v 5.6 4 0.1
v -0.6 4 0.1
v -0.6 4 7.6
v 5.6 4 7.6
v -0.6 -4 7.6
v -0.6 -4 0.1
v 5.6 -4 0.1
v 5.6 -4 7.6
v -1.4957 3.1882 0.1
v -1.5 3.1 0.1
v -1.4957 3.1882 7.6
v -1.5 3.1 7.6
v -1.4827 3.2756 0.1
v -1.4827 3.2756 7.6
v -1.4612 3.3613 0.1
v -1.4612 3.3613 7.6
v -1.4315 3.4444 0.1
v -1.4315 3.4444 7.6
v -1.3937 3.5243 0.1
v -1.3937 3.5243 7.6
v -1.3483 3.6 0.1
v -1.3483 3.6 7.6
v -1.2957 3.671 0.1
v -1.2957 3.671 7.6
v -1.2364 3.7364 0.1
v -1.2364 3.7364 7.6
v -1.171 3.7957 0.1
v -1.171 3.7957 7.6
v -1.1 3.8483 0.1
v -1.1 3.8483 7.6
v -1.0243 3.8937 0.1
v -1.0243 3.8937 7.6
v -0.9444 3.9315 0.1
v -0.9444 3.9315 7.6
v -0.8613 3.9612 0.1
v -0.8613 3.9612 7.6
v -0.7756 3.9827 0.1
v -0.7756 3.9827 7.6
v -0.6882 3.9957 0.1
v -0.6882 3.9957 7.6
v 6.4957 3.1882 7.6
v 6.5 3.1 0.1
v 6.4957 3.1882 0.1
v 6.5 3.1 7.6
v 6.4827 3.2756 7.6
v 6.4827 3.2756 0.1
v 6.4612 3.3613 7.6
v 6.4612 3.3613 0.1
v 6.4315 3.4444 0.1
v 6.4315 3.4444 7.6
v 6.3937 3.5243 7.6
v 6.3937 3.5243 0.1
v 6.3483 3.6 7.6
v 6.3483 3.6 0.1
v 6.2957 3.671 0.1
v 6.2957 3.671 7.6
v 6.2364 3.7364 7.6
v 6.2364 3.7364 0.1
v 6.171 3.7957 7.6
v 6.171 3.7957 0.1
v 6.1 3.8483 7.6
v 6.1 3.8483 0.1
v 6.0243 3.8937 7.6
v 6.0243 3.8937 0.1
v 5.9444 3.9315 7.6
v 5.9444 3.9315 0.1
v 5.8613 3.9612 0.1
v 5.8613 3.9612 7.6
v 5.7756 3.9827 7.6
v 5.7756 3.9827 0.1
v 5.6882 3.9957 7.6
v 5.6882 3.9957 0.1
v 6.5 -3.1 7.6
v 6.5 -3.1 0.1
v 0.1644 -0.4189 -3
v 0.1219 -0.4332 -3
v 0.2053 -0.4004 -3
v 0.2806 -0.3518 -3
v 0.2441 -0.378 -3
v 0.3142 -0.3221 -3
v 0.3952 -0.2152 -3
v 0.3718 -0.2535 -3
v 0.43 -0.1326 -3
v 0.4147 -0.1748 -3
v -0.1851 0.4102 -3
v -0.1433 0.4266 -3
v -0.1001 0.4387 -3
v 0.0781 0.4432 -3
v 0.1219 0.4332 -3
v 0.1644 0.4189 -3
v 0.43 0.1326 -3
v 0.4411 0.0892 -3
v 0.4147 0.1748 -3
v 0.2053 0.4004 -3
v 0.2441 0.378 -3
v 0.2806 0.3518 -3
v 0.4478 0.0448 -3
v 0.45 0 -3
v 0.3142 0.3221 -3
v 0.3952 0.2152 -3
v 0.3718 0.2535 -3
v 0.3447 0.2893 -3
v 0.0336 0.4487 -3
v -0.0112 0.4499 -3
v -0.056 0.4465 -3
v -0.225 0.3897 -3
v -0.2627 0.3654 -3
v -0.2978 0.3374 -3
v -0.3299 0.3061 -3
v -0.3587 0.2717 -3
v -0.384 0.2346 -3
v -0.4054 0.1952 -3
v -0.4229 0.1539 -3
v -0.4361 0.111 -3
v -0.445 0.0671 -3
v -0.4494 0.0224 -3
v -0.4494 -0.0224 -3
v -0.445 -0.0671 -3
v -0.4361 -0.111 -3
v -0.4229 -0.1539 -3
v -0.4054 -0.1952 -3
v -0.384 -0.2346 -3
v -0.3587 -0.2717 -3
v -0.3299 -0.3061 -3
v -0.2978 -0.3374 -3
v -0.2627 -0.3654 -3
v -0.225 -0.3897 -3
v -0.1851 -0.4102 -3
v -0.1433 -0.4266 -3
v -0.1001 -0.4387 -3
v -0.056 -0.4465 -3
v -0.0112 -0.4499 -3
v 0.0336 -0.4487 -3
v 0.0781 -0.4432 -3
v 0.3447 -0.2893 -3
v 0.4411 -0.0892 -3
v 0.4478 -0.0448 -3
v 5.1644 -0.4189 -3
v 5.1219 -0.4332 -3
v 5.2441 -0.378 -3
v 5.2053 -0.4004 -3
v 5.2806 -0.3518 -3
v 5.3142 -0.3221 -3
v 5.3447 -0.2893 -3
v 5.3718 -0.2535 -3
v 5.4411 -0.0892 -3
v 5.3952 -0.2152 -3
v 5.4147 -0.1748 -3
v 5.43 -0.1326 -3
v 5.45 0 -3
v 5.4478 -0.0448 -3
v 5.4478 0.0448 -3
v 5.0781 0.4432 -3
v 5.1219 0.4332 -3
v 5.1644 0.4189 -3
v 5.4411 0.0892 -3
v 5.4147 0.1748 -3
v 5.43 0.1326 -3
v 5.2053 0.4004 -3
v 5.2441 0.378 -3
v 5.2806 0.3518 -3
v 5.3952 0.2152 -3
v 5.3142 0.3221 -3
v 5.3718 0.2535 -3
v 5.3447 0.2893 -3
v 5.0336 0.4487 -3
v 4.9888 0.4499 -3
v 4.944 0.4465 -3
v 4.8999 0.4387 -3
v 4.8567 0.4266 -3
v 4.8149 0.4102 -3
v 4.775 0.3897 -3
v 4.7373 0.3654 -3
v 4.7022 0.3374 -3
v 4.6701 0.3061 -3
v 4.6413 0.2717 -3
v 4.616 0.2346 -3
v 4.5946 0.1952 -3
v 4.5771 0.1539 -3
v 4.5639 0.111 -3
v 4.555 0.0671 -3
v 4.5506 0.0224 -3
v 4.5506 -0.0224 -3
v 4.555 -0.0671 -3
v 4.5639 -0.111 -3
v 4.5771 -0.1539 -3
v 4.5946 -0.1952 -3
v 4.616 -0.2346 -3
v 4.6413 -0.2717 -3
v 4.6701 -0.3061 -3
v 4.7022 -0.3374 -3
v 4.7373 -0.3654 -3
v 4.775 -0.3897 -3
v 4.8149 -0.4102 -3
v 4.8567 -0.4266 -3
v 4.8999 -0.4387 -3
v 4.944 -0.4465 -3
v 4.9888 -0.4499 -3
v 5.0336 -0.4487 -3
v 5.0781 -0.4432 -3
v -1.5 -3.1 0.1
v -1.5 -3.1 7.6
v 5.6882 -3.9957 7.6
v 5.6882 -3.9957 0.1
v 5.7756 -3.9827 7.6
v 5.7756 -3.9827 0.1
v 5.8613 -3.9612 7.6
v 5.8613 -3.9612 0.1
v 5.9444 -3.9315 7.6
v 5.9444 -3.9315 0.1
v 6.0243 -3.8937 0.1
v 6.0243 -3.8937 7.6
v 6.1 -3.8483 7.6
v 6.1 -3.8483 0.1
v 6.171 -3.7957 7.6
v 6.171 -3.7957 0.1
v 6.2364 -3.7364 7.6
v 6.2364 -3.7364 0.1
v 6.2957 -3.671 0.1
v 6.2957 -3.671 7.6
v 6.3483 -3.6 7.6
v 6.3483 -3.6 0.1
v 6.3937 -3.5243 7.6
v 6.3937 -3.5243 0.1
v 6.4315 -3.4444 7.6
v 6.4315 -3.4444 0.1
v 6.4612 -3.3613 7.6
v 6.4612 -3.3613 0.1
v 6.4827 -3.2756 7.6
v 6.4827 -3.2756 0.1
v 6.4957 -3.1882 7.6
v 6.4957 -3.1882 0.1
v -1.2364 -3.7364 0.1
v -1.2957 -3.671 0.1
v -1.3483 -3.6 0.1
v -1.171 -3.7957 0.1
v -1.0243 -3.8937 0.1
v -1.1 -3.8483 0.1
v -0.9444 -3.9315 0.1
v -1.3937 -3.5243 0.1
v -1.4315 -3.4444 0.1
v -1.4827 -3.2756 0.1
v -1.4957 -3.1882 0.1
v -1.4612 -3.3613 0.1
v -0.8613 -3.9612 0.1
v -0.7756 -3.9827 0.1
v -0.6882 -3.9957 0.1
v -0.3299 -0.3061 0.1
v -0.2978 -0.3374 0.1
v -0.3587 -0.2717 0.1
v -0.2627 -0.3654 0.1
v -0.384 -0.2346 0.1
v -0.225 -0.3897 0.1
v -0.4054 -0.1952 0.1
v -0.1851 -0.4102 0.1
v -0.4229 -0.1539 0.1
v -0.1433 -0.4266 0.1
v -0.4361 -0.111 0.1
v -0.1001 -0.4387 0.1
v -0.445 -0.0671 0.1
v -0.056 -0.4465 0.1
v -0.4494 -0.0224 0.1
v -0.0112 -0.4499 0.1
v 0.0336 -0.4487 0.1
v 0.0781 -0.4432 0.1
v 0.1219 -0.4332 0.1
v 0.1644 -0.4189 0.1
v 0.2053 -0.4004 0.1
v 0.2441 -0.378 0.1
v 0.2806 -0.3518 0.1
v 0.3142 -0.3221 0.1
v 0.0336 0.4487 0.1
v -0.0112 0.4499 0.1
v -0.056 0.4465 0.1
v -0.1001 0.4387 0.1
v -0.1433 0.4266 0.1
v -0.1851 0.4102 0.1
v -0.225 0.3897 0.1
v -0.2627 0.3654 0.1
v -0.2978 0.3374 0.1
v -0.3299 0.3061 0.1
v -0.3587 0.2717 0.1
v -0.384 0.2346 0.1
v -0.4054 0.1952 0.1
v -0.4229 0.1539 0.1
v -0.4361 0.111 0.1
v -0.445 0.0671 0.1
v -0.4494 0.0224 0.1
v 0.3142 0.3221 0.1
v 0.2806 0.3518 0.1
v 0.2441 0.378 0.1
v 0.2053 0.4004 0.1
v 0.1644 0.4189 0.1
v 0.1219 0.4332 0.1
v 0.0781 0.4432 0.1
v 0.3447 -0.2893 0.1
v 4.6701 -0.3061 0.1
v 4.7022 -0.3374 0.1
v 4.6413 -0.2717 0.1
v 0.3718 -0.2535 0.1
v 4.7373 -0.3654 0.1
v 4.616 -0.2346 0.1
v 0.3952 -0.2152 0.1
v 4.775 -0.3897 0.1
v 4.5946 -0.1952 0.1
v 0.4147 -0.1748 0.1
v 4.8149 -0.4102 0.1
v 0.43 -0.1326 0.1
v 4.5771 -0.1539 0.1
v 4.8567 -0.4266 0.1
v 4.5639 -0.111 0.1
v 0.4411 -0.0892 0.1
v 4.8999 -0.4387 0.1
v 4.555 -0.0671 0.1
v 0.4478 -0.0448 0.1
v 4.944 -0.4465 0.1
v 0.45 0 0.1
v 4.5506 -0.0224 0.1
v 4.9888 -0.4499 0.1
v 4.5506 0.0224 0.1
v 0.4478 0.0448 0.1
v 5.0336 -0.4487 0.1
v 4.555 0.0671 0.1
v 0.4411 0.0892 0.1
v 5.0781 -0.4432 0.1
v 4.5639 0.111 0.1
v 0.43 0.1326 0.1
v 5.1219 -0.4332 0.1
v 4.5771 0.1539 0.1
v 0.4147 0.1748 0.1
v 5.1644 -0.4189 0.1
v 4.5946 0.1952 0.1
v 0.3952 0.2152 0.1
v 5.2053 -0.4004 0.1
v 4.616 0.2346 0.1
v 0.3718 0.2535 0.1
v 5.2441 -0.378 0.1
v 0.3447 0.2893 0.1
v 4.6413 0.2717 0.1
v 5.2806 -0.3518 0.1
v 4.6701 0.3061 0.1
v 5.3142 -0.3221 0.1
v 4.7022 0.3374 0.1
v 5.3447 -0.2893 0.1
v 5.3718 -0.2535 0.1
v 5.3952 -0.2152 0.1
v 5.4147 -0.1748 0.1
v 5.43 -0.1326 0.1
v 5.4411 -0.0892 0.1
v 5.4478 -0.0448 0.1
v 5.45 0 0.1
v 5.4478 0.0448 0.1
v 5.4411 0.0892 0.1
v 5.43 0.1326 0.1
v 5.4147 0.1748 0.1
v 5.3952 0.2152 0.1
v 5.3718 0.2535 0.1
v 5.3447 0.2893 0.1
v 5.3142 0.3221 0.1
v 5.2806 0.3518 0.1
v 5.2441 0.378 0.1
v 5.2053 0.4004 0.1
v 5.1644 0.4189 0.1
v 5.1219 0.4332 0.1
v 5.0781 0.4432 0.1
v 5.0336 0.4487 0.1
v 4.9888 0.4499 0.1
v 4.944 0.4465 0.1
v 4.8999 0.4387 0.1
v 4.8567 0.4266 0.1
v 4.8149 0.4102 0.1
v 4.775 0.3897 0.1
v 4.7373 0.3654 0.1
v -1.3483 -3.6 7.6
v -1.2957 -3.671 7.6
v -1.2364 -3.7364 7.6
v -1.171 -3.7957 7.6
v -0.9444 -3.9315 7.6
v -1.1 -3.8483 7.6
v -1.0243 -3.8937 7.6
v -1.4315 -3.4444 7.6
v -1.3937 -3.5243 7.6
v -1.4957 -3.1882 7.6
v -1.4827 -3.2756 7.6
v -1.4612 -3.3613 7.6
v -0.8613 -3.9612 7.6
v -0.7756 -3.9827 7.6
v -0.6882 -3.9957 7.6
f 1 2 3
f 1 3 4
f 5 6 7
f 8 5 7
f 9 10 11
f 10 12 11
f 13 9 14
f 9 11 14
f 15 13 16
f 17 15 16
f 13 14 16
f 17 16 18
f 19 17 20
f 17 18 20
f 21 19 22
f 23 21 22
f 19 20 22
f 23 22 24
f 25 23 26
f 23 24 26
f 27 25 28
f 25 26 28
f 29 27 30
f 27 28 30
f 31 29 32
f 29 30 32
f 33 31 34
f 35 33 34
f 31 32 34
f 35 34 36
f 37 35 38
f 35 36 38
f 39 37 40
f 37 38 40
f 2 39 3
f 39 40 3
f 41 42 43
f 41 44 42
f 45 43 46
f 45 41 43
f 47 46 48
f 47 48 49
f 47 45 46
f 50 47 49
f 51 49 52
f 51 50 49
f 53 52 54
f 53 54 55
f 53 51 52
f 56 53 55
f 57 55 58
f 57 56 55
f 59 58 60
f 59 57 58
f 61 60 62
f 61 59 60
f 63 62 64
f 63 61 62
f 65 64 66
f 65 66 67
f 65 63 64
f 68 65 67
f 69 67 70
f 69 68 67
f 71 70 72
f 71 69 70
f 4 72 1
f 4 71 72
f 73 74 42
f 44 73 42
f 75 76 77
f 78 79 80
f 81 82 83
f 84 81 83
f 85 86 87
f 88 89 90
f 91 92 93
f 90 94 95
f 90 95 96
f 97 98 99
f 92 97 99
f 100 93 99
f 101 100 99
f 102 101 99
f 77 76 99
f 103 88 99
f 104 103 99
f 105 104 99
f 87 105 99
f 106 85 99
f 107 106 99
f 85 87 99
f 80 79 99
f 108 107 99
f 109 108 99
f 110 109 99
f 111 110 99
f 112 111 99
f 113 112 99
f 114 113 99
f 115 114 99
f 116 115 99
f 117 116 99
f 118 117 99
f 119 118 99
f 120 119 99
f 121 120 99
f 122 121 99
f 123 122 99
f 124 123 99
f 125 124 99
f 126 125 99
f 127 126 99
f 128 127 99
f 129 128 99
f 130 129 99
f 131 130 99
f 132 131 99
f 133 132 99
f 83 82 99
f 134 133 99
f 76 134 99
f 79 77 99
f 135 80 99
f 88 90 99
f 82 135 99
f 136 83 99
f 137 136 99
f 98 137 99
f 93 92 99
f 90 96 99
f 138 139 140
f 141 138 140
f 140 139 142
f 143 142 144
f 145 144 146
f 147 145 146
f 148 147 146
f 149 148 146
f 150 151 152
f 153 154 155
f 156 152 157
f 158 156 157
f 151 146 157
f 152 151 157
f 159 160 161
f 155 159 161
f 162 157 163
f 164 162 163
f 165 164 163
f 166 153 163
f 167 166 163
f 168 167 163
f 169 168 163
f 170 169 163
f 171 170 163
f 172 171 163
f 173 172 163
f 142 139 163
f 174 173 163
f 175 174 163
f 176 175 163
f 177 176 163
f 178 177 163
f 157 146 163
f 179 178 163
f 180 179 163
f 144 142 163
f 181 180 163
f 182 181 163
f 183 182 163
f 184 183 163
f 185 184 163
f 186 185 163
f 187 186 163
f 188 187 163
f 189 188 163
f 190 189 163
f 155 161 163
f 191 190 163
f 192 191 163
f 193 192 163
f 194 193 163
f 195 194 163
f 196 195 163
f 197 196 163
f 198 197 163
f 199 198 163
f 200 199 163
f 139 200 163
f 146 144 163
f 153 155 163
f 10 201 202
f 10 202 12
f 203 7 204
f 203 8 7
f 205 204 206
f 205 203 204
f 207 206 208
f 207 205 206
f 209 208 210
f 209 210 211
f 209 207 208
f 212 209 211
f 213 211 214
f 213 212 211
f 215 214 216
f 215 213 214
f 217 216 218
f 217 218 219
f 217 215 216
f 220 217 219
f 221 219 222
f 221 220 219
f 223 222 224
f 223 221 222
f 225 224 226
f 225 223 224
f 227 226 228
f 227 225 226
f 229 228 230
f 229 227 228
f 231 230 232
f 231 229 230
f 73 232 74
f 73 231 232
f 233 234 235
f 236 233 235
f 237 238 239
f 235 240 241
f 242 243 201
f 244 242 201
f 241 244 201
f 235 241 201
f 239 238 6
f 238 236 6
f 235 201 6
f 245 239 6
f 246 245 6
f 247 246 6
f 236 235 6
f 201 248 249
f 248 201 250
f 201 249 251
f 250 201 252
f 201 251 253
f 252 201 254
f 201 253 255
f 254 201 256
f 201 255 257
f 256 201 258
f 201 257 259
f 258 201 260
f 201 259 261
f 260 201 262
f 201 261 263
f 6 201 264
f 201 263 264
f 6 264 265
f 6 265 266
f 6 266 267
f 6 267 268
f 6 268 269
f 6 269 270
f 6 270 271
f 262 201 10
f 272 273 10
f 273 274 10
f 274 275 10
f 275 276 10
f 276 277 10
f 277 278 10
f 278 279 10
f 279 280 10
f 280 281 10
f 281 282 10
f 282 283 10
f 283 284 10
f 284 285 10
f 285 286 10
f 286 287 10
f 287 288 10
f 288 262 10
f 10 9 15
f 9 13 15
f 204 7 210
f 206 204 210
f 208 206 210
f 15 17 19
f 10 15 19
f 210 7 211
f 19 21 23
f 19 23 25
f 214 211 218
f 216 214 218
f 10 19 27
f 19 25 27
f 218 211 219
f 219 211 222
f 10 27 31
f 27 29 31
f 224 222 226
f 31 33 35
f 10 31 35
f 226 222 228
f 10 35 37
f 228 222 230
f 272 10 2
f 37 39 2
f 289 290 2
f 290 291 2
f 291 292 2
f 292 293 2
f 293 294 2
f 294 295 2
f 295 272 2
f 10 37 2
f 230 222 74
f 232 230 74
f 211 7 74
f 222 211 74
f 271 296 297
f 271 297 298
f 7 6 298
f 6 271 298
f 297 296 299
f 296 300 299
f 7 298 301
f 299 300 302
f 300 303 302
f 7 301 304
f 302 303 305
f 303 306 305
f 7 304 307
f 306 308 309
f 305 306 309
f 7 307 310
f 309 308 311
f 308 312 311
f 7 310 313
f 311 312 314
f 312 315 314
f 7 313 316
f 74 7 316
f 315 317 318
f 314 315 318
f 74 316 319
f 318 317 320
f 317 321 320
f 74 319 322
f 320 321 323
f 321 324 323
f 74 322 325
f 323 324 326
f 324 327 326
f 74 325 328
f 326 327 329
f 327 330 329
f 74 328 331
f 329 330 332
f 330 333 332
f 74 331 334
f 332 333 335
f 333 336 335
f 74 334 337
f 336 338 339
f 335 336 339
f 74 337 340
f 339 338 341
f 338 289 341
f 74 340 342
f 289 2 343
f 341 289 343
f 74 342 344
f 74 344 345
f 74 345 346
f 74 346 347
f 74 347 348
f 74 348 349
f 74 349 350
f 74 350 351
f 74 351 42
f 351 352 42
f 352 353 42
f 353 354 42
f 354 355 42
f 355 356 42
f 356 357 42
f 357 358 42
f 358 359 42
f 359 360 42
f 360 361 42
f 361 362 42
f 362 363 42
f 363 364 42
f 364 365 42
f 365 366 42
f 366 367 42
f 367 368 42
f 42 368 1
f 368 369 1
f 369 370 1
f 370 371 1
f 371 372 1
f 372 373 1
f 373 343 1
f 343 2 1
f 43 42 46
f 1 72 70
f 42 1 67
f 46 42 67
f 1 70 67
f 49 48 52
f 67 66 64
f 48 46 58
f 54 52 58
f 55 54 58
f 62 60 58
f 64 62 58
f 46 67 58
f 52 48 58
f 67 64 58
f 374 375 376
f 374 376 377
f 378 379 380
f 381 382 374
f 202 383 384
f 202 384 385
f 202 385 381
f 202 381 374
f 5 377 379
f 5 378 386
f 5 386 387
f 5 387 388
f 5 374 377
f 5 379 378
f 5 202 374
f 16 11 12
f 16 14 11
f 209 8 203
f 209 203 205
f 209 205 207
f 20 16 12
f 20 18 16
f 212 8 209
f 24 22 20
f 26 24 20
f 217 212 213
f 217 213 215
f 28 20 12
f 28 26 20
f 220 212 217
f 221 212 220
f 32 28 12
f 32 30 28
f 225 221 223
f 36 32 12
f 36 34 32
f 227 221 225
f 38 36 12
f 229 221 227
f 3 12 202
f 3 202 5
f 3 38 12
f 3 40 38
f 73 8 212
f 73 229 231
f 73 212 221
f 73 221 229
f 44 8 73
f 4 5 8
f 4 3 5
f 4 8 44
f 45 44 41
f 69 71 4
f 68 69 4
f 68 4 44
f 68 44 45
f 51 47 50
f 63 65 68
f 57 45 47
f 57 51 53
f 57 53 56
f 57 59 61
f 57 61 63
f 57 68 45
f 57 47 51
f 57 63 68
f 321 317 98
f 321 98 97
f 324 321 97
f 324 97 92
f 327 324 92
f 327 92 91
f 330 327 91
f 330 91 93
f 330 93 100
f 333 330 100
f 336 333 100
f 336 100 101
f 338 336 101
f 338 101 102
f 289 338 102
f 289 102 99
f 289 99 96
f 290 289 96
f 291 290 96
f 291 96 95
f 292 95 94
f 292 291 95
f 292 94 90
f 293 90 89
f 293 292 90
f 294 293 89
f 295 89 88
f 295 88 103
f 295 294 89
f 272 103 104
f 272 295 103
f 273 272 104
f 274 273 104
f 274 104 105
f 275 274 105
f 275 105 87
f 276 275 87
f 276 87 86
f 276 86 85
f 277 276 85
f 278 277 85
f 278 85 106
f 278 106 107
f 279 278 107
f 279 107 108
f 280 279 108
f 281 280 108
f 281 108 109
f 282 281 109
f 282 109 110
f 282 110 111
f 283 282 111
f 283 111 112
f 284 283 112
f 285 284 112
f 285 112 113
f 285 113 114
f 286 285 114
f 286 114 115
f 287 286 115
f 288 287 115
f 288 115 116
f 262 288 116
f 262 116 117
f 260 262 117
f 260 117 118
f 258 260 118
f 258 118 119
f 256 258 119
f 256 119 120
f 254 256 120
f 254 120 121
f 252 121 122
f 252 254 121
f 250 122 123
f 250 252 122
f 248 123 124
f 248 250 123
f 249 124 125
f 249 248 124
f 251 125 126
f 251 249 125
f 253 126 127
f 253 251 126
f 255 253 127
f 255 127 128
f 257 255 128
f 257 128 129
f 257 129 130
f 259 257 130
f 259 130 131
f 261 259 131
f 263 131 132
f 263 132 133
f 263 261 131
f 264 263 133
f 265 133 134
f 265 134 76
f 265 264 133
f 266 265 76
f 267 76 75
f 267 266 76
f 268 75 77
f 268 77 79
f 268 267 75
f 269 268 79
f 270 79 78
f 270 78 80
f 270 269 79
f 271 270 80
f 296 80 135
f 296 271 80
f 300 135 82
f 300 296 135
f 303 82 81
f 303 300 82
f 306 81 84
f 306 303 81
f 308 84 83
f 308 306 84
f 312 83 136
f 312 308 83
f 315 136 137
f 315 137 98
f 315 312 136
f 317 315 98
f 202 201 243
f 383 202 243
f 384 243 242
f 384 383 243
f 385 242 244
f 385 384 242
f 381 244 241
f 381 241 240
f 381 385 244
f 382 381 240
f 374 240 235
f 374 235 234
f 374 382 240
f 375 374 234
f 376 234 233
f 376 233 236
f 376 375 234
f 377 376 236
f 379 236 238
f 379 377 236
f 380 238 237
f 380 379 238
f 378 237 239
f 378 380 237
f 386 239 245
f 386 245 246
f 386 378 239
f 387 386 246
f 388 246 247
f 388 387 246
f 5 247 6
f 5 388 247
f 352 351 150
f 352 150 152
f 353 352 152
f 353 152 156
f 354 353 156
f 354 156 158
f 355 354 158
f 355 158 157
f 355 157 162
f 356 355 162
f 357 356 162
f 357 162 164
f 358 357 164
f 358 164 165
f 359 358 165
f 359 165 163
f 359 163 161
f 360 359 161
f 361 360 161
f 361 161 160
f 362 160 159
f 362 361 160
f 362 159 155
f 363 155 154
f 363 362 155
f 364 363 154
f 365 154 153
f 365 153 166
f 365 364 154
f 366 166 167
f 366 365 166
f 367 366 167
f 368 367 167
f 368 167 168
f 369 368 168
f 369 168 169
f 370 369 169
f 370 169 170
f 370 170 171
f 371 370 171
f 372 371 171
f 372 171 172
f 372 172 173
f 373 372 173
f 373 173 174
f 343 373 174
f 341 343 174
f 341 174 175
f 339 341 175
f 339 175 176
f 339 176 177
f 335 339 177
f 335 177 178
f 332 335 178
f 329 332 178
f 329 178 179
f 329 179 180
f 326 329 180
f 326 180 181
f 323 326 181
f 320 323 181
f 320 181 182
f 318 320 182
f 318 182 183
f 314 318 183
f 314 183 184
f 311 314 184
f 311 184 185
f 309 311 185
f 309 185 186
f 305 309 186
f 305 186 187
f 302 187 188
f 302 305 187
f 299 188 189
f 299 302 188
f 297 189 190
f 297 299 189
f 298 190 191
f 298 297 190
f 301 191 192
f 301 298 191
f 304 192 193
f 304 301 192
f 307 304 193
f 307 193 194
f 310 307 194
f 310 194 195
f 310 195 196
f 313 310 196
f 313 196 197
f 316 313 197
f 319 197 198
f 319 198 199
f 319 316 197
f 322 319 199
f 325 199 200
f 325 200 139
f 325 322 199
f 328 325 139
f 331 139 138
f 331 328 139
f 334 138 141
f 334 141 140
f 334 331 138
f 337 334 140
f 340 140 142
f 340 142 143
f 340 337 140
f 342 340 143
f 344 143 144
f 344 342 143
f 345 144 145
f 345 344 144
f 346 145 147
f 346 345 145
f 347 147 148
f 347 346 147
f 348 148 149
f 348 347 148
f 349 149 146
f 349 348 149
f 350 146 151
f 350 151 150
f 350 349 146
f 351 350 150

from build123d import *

# Parameters (mm, degrees)
SKETCH001_R  = 0.45
PAD001_DEPTH = 3.5
SKETCH_W     = 8
SKETCH_H     = 8
PAD_DEPTH    = 7.5
FILLET_R     = 0.9


with BuildPart() as pad001:
    # Sketch001 → Pad001 (new body)
    with BuildSketch(Plane.XY.offset(0.5)):
        Circle(SKETCH001_R)
        with Locations((5, 0)):
            Circle(SKETCH001_R)
    extrude(amount=-PAD001_DEPTH)


with BuildPart() as fillet_mp_cp:
    # Sketch → Pad (new body)
    with BuildSketch(Plane.XY.offset(0.1)):
        with Locations((2.5, 0)):
            Rectangle(SKETCH_W, SKETCH_H)
    extrude(amount=PAD_DEPTH)

    # Fillet
    fillet_edges = [fillet_mp_cp.edges().sort_by_distance(p)[0] for p in [
        (6.5, -4, 3.85),
        (6.5, 4, 3.85),
        (-1.5, -4, 3.85),
        (-1.5, 4, 3.85),
    ]]
    fillet(fillet_edges, radius=FILLET_R)

    # Fillet_mp_cp: union Pad001
    add(pad001.part)


solid = fillet_mp_cp.part
